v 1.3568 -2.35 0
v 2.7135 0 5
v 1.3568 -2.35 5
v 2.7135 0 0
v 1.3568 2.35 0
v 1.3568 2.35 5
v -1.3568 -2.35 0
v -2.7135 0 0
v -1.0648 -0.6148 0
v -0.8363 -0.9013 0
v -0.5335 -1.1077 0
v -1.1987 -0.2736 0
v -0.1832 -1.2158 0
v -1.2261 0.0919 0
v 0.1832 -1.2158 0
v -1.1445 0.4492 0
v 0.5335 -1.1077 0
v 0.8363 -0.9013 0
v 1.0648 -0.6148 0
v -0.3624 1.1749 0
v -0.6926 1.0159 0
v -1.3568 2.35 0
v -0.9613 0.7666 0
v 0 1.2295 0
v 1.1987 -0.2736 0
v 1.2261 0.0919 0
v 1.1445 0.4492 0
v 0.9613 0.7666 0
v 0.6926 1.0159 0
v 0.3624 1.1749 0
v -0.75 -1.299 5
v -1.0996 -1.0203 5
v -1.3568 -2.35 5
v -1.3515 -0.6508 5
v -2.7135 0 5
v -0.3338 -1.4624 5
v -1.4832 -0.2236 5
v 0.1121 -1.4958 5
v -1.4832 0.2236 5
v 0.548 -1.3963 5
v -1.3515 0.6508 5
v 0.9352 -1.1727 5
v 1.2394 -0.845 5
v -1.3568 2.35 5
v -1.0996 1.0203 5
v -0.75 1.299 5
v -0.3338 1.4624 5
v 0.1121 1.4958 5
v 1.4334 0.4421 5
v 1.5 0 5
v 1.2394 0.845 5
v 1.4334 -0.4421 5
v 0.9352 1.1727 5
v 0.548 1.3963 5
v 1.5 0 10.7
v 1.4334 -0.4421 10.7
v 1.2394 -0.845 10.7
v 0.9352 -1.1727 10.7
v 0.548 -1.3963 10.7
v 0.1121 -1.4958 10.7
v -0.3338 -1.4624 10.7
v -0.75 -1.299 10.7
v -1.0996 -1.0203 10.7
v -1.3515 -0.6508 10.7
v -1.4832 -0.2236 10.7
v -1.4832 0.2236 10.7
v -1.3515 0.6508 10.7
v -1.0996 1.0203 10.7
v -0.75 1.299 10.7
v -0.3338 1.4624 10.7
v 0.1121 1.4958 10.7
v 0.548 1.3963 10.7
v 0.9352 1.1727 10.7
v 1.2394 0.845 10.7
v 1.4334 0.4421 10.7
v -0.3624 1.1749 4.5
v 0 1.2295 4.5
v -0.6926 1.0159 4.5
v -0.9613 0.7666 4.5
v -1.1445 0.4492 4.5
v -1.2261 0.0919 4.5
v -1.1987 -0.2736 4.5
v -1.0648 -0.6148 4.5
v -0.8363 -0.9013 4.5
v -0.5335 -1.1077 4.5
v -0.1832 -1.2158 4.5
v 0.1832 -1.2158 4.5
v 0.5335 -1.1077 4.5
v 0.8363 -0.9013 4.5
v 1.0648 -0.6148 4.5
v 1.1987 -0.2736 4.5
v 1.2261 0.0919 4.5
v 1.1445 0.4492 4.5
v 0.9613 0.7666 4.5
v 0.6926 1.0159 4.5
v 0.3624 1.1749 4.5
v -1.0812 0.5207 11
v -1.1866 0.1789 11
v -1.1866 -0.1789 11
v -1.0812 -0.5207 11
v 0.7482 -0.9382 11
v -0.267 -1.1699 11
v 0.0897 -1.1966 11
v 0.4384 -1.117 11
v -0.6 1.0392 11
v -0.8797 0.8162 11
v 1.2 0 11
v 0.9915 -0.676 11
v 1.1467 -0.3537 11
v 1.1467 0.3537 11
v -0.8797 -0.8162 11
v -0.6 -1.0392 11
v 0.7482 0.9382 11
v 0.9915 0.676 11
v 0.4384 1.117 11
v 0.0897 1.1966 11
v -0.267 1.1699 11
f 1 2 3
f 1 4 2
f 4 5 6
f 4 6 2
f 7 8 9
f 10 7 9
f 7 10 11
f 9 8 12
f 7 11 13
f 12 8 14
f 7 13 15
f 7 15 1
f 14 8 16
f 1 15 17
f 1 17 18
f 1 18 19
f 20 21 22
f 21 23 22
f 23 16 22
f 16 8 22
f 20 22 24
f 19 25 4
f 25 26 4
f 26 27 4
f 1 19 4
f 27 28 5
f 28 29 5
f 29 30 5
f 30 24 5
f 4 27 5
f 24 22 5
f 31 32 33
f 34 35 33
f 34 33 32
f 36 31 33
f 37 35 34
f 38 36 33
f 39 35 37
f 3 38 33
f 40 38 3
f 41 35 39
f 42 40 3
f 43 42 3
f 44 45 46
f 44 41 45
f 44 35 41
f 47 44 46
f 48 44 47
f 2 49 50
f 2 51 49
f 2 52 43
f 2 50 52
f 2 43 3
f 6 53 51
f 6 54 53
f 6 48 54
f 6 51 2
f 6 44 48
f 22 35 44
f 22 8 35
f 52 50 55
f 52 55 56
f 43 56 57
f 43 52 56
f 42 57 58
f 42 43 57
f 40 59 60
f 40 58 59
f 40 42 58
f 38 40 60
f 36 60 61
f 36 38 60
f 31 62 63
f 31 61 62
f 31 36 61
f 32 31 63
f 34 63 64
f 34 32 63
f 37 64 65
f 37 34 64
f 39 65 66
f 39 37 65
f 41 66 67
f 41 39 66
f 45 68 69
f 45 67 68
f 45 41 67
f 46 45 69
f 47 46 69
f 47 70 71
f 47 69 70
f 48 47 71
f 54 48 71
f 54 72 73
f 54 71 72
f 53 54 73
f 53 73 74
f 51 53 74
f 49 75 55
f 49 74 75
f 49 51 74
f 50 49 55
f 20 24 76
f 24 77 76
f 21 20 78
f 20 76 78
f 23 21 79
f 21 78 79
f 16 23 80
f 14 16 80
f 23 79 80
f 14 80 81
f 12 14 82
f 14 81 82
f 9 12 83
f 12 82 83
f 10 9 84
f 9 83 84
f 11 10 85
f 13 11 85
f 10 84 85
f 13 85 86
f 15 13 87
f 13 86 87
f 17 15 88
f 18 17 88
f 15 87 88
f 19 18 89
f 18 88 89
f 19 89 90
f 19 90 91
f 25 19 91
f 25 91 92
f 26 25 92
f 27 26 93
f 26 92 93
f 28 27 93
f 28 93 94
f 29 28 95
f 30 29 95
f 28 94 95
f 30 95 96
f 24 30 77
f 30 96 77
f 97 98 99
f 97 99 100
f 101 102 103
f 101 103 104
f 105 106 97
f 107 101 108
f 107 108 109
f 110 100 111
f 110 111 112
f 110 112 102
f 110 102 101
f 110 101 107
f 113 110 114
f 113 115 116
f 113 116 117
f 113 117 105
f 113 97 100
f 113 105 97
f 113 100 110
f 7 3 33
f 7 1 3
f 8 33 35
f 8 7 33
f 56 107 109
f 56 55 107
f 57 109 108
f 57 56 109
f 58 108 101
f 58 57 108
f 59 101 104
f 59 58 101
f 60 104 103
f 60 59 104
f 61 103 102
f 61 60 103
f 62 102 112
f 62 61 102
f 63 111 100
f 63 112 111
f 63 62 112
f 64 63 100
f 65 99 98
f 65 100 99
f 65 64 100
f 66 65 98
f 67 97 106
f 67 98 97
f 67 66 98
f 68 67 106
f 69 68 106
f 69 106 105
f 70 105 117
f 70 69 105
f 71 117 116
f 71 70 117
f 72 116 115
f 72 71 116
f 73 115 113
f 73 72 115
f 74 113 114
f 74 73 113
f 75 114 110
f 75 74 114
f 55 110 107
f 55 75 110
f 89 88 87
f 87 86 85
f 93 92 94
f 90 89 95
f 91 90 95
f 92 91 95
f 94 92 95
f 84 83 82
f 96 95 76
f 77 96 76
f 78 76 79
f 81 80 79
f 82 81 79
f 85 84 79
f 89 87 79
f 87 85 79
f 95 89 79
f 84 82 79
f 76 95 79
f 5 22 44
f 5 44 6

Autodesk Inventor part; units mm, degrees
ref_plane "YZ Plane" through (0, 0, 0) normal (1, 0, 0) x (0, 1, 0)
ref_plane "XZ Plane" through (0, 0, 0) normal (0, 1, 0) x (-1, 0, 0)
ref_plane "XY Plane" through (0, 0, 0) normal (0, 0, 1) x (1, 0, 0)
sketch "Sketch1" plane through (0, 0, 0) normal (0, 0, 1) x (1, 0, 0)
  line L0 (2.7135, 0) -> (1.3568, -2.35)
  line L1 (1.3568, -2.35) -> (-1.3568, -2.35)
  line L2 (-1.3568, -2.35) -> (-2.7135, 0)
  line L3 (-2.7135, 0) -> (-1.3568, 2.35)
  line L4 (-1.3568, 2.35) -> (1.3568, 2.35)
  line L5 (1.3568, 2.35) -> (2.7135, 0)
  point P0 (0, 0)
  point P1 (0, 0)
  dimension "d0" = 4.7
extrude "Extrusion1" add sketch "Sketch1" along normal blind 5
sketch "Sketch2" plane through (0, 0, 5) normal (0, 0, 1) x (1, 0, 0)
  circle A0 centre (0, 0) radius 1.5
  dimension "d3" = 3
extrude "Extrusion2" add sketch "Sketch2" along normal blind 6
thread "Thread1" size "M3x0.5" class "6g" standard "ANSI Metric M Profile" full length
chamfer "Chamfer1" distance 0.3 angle 45 1 edges at (-1.5, 0, 11)
sketch "Sketch3" plane through (0, 0, 0) normal (0, 0, -1) x (-1, 0, 0)
  point P0 (0, 0)
  point P1 (0, 0)
hole "Hole1" at (0, 0, 0) direction (0, 0, 1) diameter 2.459 depth 4.5 thread size "M3x0.5" class "6H" standard "ANSI Metric M Profile"
properties part number "5mm M3 Brass Standoff"
